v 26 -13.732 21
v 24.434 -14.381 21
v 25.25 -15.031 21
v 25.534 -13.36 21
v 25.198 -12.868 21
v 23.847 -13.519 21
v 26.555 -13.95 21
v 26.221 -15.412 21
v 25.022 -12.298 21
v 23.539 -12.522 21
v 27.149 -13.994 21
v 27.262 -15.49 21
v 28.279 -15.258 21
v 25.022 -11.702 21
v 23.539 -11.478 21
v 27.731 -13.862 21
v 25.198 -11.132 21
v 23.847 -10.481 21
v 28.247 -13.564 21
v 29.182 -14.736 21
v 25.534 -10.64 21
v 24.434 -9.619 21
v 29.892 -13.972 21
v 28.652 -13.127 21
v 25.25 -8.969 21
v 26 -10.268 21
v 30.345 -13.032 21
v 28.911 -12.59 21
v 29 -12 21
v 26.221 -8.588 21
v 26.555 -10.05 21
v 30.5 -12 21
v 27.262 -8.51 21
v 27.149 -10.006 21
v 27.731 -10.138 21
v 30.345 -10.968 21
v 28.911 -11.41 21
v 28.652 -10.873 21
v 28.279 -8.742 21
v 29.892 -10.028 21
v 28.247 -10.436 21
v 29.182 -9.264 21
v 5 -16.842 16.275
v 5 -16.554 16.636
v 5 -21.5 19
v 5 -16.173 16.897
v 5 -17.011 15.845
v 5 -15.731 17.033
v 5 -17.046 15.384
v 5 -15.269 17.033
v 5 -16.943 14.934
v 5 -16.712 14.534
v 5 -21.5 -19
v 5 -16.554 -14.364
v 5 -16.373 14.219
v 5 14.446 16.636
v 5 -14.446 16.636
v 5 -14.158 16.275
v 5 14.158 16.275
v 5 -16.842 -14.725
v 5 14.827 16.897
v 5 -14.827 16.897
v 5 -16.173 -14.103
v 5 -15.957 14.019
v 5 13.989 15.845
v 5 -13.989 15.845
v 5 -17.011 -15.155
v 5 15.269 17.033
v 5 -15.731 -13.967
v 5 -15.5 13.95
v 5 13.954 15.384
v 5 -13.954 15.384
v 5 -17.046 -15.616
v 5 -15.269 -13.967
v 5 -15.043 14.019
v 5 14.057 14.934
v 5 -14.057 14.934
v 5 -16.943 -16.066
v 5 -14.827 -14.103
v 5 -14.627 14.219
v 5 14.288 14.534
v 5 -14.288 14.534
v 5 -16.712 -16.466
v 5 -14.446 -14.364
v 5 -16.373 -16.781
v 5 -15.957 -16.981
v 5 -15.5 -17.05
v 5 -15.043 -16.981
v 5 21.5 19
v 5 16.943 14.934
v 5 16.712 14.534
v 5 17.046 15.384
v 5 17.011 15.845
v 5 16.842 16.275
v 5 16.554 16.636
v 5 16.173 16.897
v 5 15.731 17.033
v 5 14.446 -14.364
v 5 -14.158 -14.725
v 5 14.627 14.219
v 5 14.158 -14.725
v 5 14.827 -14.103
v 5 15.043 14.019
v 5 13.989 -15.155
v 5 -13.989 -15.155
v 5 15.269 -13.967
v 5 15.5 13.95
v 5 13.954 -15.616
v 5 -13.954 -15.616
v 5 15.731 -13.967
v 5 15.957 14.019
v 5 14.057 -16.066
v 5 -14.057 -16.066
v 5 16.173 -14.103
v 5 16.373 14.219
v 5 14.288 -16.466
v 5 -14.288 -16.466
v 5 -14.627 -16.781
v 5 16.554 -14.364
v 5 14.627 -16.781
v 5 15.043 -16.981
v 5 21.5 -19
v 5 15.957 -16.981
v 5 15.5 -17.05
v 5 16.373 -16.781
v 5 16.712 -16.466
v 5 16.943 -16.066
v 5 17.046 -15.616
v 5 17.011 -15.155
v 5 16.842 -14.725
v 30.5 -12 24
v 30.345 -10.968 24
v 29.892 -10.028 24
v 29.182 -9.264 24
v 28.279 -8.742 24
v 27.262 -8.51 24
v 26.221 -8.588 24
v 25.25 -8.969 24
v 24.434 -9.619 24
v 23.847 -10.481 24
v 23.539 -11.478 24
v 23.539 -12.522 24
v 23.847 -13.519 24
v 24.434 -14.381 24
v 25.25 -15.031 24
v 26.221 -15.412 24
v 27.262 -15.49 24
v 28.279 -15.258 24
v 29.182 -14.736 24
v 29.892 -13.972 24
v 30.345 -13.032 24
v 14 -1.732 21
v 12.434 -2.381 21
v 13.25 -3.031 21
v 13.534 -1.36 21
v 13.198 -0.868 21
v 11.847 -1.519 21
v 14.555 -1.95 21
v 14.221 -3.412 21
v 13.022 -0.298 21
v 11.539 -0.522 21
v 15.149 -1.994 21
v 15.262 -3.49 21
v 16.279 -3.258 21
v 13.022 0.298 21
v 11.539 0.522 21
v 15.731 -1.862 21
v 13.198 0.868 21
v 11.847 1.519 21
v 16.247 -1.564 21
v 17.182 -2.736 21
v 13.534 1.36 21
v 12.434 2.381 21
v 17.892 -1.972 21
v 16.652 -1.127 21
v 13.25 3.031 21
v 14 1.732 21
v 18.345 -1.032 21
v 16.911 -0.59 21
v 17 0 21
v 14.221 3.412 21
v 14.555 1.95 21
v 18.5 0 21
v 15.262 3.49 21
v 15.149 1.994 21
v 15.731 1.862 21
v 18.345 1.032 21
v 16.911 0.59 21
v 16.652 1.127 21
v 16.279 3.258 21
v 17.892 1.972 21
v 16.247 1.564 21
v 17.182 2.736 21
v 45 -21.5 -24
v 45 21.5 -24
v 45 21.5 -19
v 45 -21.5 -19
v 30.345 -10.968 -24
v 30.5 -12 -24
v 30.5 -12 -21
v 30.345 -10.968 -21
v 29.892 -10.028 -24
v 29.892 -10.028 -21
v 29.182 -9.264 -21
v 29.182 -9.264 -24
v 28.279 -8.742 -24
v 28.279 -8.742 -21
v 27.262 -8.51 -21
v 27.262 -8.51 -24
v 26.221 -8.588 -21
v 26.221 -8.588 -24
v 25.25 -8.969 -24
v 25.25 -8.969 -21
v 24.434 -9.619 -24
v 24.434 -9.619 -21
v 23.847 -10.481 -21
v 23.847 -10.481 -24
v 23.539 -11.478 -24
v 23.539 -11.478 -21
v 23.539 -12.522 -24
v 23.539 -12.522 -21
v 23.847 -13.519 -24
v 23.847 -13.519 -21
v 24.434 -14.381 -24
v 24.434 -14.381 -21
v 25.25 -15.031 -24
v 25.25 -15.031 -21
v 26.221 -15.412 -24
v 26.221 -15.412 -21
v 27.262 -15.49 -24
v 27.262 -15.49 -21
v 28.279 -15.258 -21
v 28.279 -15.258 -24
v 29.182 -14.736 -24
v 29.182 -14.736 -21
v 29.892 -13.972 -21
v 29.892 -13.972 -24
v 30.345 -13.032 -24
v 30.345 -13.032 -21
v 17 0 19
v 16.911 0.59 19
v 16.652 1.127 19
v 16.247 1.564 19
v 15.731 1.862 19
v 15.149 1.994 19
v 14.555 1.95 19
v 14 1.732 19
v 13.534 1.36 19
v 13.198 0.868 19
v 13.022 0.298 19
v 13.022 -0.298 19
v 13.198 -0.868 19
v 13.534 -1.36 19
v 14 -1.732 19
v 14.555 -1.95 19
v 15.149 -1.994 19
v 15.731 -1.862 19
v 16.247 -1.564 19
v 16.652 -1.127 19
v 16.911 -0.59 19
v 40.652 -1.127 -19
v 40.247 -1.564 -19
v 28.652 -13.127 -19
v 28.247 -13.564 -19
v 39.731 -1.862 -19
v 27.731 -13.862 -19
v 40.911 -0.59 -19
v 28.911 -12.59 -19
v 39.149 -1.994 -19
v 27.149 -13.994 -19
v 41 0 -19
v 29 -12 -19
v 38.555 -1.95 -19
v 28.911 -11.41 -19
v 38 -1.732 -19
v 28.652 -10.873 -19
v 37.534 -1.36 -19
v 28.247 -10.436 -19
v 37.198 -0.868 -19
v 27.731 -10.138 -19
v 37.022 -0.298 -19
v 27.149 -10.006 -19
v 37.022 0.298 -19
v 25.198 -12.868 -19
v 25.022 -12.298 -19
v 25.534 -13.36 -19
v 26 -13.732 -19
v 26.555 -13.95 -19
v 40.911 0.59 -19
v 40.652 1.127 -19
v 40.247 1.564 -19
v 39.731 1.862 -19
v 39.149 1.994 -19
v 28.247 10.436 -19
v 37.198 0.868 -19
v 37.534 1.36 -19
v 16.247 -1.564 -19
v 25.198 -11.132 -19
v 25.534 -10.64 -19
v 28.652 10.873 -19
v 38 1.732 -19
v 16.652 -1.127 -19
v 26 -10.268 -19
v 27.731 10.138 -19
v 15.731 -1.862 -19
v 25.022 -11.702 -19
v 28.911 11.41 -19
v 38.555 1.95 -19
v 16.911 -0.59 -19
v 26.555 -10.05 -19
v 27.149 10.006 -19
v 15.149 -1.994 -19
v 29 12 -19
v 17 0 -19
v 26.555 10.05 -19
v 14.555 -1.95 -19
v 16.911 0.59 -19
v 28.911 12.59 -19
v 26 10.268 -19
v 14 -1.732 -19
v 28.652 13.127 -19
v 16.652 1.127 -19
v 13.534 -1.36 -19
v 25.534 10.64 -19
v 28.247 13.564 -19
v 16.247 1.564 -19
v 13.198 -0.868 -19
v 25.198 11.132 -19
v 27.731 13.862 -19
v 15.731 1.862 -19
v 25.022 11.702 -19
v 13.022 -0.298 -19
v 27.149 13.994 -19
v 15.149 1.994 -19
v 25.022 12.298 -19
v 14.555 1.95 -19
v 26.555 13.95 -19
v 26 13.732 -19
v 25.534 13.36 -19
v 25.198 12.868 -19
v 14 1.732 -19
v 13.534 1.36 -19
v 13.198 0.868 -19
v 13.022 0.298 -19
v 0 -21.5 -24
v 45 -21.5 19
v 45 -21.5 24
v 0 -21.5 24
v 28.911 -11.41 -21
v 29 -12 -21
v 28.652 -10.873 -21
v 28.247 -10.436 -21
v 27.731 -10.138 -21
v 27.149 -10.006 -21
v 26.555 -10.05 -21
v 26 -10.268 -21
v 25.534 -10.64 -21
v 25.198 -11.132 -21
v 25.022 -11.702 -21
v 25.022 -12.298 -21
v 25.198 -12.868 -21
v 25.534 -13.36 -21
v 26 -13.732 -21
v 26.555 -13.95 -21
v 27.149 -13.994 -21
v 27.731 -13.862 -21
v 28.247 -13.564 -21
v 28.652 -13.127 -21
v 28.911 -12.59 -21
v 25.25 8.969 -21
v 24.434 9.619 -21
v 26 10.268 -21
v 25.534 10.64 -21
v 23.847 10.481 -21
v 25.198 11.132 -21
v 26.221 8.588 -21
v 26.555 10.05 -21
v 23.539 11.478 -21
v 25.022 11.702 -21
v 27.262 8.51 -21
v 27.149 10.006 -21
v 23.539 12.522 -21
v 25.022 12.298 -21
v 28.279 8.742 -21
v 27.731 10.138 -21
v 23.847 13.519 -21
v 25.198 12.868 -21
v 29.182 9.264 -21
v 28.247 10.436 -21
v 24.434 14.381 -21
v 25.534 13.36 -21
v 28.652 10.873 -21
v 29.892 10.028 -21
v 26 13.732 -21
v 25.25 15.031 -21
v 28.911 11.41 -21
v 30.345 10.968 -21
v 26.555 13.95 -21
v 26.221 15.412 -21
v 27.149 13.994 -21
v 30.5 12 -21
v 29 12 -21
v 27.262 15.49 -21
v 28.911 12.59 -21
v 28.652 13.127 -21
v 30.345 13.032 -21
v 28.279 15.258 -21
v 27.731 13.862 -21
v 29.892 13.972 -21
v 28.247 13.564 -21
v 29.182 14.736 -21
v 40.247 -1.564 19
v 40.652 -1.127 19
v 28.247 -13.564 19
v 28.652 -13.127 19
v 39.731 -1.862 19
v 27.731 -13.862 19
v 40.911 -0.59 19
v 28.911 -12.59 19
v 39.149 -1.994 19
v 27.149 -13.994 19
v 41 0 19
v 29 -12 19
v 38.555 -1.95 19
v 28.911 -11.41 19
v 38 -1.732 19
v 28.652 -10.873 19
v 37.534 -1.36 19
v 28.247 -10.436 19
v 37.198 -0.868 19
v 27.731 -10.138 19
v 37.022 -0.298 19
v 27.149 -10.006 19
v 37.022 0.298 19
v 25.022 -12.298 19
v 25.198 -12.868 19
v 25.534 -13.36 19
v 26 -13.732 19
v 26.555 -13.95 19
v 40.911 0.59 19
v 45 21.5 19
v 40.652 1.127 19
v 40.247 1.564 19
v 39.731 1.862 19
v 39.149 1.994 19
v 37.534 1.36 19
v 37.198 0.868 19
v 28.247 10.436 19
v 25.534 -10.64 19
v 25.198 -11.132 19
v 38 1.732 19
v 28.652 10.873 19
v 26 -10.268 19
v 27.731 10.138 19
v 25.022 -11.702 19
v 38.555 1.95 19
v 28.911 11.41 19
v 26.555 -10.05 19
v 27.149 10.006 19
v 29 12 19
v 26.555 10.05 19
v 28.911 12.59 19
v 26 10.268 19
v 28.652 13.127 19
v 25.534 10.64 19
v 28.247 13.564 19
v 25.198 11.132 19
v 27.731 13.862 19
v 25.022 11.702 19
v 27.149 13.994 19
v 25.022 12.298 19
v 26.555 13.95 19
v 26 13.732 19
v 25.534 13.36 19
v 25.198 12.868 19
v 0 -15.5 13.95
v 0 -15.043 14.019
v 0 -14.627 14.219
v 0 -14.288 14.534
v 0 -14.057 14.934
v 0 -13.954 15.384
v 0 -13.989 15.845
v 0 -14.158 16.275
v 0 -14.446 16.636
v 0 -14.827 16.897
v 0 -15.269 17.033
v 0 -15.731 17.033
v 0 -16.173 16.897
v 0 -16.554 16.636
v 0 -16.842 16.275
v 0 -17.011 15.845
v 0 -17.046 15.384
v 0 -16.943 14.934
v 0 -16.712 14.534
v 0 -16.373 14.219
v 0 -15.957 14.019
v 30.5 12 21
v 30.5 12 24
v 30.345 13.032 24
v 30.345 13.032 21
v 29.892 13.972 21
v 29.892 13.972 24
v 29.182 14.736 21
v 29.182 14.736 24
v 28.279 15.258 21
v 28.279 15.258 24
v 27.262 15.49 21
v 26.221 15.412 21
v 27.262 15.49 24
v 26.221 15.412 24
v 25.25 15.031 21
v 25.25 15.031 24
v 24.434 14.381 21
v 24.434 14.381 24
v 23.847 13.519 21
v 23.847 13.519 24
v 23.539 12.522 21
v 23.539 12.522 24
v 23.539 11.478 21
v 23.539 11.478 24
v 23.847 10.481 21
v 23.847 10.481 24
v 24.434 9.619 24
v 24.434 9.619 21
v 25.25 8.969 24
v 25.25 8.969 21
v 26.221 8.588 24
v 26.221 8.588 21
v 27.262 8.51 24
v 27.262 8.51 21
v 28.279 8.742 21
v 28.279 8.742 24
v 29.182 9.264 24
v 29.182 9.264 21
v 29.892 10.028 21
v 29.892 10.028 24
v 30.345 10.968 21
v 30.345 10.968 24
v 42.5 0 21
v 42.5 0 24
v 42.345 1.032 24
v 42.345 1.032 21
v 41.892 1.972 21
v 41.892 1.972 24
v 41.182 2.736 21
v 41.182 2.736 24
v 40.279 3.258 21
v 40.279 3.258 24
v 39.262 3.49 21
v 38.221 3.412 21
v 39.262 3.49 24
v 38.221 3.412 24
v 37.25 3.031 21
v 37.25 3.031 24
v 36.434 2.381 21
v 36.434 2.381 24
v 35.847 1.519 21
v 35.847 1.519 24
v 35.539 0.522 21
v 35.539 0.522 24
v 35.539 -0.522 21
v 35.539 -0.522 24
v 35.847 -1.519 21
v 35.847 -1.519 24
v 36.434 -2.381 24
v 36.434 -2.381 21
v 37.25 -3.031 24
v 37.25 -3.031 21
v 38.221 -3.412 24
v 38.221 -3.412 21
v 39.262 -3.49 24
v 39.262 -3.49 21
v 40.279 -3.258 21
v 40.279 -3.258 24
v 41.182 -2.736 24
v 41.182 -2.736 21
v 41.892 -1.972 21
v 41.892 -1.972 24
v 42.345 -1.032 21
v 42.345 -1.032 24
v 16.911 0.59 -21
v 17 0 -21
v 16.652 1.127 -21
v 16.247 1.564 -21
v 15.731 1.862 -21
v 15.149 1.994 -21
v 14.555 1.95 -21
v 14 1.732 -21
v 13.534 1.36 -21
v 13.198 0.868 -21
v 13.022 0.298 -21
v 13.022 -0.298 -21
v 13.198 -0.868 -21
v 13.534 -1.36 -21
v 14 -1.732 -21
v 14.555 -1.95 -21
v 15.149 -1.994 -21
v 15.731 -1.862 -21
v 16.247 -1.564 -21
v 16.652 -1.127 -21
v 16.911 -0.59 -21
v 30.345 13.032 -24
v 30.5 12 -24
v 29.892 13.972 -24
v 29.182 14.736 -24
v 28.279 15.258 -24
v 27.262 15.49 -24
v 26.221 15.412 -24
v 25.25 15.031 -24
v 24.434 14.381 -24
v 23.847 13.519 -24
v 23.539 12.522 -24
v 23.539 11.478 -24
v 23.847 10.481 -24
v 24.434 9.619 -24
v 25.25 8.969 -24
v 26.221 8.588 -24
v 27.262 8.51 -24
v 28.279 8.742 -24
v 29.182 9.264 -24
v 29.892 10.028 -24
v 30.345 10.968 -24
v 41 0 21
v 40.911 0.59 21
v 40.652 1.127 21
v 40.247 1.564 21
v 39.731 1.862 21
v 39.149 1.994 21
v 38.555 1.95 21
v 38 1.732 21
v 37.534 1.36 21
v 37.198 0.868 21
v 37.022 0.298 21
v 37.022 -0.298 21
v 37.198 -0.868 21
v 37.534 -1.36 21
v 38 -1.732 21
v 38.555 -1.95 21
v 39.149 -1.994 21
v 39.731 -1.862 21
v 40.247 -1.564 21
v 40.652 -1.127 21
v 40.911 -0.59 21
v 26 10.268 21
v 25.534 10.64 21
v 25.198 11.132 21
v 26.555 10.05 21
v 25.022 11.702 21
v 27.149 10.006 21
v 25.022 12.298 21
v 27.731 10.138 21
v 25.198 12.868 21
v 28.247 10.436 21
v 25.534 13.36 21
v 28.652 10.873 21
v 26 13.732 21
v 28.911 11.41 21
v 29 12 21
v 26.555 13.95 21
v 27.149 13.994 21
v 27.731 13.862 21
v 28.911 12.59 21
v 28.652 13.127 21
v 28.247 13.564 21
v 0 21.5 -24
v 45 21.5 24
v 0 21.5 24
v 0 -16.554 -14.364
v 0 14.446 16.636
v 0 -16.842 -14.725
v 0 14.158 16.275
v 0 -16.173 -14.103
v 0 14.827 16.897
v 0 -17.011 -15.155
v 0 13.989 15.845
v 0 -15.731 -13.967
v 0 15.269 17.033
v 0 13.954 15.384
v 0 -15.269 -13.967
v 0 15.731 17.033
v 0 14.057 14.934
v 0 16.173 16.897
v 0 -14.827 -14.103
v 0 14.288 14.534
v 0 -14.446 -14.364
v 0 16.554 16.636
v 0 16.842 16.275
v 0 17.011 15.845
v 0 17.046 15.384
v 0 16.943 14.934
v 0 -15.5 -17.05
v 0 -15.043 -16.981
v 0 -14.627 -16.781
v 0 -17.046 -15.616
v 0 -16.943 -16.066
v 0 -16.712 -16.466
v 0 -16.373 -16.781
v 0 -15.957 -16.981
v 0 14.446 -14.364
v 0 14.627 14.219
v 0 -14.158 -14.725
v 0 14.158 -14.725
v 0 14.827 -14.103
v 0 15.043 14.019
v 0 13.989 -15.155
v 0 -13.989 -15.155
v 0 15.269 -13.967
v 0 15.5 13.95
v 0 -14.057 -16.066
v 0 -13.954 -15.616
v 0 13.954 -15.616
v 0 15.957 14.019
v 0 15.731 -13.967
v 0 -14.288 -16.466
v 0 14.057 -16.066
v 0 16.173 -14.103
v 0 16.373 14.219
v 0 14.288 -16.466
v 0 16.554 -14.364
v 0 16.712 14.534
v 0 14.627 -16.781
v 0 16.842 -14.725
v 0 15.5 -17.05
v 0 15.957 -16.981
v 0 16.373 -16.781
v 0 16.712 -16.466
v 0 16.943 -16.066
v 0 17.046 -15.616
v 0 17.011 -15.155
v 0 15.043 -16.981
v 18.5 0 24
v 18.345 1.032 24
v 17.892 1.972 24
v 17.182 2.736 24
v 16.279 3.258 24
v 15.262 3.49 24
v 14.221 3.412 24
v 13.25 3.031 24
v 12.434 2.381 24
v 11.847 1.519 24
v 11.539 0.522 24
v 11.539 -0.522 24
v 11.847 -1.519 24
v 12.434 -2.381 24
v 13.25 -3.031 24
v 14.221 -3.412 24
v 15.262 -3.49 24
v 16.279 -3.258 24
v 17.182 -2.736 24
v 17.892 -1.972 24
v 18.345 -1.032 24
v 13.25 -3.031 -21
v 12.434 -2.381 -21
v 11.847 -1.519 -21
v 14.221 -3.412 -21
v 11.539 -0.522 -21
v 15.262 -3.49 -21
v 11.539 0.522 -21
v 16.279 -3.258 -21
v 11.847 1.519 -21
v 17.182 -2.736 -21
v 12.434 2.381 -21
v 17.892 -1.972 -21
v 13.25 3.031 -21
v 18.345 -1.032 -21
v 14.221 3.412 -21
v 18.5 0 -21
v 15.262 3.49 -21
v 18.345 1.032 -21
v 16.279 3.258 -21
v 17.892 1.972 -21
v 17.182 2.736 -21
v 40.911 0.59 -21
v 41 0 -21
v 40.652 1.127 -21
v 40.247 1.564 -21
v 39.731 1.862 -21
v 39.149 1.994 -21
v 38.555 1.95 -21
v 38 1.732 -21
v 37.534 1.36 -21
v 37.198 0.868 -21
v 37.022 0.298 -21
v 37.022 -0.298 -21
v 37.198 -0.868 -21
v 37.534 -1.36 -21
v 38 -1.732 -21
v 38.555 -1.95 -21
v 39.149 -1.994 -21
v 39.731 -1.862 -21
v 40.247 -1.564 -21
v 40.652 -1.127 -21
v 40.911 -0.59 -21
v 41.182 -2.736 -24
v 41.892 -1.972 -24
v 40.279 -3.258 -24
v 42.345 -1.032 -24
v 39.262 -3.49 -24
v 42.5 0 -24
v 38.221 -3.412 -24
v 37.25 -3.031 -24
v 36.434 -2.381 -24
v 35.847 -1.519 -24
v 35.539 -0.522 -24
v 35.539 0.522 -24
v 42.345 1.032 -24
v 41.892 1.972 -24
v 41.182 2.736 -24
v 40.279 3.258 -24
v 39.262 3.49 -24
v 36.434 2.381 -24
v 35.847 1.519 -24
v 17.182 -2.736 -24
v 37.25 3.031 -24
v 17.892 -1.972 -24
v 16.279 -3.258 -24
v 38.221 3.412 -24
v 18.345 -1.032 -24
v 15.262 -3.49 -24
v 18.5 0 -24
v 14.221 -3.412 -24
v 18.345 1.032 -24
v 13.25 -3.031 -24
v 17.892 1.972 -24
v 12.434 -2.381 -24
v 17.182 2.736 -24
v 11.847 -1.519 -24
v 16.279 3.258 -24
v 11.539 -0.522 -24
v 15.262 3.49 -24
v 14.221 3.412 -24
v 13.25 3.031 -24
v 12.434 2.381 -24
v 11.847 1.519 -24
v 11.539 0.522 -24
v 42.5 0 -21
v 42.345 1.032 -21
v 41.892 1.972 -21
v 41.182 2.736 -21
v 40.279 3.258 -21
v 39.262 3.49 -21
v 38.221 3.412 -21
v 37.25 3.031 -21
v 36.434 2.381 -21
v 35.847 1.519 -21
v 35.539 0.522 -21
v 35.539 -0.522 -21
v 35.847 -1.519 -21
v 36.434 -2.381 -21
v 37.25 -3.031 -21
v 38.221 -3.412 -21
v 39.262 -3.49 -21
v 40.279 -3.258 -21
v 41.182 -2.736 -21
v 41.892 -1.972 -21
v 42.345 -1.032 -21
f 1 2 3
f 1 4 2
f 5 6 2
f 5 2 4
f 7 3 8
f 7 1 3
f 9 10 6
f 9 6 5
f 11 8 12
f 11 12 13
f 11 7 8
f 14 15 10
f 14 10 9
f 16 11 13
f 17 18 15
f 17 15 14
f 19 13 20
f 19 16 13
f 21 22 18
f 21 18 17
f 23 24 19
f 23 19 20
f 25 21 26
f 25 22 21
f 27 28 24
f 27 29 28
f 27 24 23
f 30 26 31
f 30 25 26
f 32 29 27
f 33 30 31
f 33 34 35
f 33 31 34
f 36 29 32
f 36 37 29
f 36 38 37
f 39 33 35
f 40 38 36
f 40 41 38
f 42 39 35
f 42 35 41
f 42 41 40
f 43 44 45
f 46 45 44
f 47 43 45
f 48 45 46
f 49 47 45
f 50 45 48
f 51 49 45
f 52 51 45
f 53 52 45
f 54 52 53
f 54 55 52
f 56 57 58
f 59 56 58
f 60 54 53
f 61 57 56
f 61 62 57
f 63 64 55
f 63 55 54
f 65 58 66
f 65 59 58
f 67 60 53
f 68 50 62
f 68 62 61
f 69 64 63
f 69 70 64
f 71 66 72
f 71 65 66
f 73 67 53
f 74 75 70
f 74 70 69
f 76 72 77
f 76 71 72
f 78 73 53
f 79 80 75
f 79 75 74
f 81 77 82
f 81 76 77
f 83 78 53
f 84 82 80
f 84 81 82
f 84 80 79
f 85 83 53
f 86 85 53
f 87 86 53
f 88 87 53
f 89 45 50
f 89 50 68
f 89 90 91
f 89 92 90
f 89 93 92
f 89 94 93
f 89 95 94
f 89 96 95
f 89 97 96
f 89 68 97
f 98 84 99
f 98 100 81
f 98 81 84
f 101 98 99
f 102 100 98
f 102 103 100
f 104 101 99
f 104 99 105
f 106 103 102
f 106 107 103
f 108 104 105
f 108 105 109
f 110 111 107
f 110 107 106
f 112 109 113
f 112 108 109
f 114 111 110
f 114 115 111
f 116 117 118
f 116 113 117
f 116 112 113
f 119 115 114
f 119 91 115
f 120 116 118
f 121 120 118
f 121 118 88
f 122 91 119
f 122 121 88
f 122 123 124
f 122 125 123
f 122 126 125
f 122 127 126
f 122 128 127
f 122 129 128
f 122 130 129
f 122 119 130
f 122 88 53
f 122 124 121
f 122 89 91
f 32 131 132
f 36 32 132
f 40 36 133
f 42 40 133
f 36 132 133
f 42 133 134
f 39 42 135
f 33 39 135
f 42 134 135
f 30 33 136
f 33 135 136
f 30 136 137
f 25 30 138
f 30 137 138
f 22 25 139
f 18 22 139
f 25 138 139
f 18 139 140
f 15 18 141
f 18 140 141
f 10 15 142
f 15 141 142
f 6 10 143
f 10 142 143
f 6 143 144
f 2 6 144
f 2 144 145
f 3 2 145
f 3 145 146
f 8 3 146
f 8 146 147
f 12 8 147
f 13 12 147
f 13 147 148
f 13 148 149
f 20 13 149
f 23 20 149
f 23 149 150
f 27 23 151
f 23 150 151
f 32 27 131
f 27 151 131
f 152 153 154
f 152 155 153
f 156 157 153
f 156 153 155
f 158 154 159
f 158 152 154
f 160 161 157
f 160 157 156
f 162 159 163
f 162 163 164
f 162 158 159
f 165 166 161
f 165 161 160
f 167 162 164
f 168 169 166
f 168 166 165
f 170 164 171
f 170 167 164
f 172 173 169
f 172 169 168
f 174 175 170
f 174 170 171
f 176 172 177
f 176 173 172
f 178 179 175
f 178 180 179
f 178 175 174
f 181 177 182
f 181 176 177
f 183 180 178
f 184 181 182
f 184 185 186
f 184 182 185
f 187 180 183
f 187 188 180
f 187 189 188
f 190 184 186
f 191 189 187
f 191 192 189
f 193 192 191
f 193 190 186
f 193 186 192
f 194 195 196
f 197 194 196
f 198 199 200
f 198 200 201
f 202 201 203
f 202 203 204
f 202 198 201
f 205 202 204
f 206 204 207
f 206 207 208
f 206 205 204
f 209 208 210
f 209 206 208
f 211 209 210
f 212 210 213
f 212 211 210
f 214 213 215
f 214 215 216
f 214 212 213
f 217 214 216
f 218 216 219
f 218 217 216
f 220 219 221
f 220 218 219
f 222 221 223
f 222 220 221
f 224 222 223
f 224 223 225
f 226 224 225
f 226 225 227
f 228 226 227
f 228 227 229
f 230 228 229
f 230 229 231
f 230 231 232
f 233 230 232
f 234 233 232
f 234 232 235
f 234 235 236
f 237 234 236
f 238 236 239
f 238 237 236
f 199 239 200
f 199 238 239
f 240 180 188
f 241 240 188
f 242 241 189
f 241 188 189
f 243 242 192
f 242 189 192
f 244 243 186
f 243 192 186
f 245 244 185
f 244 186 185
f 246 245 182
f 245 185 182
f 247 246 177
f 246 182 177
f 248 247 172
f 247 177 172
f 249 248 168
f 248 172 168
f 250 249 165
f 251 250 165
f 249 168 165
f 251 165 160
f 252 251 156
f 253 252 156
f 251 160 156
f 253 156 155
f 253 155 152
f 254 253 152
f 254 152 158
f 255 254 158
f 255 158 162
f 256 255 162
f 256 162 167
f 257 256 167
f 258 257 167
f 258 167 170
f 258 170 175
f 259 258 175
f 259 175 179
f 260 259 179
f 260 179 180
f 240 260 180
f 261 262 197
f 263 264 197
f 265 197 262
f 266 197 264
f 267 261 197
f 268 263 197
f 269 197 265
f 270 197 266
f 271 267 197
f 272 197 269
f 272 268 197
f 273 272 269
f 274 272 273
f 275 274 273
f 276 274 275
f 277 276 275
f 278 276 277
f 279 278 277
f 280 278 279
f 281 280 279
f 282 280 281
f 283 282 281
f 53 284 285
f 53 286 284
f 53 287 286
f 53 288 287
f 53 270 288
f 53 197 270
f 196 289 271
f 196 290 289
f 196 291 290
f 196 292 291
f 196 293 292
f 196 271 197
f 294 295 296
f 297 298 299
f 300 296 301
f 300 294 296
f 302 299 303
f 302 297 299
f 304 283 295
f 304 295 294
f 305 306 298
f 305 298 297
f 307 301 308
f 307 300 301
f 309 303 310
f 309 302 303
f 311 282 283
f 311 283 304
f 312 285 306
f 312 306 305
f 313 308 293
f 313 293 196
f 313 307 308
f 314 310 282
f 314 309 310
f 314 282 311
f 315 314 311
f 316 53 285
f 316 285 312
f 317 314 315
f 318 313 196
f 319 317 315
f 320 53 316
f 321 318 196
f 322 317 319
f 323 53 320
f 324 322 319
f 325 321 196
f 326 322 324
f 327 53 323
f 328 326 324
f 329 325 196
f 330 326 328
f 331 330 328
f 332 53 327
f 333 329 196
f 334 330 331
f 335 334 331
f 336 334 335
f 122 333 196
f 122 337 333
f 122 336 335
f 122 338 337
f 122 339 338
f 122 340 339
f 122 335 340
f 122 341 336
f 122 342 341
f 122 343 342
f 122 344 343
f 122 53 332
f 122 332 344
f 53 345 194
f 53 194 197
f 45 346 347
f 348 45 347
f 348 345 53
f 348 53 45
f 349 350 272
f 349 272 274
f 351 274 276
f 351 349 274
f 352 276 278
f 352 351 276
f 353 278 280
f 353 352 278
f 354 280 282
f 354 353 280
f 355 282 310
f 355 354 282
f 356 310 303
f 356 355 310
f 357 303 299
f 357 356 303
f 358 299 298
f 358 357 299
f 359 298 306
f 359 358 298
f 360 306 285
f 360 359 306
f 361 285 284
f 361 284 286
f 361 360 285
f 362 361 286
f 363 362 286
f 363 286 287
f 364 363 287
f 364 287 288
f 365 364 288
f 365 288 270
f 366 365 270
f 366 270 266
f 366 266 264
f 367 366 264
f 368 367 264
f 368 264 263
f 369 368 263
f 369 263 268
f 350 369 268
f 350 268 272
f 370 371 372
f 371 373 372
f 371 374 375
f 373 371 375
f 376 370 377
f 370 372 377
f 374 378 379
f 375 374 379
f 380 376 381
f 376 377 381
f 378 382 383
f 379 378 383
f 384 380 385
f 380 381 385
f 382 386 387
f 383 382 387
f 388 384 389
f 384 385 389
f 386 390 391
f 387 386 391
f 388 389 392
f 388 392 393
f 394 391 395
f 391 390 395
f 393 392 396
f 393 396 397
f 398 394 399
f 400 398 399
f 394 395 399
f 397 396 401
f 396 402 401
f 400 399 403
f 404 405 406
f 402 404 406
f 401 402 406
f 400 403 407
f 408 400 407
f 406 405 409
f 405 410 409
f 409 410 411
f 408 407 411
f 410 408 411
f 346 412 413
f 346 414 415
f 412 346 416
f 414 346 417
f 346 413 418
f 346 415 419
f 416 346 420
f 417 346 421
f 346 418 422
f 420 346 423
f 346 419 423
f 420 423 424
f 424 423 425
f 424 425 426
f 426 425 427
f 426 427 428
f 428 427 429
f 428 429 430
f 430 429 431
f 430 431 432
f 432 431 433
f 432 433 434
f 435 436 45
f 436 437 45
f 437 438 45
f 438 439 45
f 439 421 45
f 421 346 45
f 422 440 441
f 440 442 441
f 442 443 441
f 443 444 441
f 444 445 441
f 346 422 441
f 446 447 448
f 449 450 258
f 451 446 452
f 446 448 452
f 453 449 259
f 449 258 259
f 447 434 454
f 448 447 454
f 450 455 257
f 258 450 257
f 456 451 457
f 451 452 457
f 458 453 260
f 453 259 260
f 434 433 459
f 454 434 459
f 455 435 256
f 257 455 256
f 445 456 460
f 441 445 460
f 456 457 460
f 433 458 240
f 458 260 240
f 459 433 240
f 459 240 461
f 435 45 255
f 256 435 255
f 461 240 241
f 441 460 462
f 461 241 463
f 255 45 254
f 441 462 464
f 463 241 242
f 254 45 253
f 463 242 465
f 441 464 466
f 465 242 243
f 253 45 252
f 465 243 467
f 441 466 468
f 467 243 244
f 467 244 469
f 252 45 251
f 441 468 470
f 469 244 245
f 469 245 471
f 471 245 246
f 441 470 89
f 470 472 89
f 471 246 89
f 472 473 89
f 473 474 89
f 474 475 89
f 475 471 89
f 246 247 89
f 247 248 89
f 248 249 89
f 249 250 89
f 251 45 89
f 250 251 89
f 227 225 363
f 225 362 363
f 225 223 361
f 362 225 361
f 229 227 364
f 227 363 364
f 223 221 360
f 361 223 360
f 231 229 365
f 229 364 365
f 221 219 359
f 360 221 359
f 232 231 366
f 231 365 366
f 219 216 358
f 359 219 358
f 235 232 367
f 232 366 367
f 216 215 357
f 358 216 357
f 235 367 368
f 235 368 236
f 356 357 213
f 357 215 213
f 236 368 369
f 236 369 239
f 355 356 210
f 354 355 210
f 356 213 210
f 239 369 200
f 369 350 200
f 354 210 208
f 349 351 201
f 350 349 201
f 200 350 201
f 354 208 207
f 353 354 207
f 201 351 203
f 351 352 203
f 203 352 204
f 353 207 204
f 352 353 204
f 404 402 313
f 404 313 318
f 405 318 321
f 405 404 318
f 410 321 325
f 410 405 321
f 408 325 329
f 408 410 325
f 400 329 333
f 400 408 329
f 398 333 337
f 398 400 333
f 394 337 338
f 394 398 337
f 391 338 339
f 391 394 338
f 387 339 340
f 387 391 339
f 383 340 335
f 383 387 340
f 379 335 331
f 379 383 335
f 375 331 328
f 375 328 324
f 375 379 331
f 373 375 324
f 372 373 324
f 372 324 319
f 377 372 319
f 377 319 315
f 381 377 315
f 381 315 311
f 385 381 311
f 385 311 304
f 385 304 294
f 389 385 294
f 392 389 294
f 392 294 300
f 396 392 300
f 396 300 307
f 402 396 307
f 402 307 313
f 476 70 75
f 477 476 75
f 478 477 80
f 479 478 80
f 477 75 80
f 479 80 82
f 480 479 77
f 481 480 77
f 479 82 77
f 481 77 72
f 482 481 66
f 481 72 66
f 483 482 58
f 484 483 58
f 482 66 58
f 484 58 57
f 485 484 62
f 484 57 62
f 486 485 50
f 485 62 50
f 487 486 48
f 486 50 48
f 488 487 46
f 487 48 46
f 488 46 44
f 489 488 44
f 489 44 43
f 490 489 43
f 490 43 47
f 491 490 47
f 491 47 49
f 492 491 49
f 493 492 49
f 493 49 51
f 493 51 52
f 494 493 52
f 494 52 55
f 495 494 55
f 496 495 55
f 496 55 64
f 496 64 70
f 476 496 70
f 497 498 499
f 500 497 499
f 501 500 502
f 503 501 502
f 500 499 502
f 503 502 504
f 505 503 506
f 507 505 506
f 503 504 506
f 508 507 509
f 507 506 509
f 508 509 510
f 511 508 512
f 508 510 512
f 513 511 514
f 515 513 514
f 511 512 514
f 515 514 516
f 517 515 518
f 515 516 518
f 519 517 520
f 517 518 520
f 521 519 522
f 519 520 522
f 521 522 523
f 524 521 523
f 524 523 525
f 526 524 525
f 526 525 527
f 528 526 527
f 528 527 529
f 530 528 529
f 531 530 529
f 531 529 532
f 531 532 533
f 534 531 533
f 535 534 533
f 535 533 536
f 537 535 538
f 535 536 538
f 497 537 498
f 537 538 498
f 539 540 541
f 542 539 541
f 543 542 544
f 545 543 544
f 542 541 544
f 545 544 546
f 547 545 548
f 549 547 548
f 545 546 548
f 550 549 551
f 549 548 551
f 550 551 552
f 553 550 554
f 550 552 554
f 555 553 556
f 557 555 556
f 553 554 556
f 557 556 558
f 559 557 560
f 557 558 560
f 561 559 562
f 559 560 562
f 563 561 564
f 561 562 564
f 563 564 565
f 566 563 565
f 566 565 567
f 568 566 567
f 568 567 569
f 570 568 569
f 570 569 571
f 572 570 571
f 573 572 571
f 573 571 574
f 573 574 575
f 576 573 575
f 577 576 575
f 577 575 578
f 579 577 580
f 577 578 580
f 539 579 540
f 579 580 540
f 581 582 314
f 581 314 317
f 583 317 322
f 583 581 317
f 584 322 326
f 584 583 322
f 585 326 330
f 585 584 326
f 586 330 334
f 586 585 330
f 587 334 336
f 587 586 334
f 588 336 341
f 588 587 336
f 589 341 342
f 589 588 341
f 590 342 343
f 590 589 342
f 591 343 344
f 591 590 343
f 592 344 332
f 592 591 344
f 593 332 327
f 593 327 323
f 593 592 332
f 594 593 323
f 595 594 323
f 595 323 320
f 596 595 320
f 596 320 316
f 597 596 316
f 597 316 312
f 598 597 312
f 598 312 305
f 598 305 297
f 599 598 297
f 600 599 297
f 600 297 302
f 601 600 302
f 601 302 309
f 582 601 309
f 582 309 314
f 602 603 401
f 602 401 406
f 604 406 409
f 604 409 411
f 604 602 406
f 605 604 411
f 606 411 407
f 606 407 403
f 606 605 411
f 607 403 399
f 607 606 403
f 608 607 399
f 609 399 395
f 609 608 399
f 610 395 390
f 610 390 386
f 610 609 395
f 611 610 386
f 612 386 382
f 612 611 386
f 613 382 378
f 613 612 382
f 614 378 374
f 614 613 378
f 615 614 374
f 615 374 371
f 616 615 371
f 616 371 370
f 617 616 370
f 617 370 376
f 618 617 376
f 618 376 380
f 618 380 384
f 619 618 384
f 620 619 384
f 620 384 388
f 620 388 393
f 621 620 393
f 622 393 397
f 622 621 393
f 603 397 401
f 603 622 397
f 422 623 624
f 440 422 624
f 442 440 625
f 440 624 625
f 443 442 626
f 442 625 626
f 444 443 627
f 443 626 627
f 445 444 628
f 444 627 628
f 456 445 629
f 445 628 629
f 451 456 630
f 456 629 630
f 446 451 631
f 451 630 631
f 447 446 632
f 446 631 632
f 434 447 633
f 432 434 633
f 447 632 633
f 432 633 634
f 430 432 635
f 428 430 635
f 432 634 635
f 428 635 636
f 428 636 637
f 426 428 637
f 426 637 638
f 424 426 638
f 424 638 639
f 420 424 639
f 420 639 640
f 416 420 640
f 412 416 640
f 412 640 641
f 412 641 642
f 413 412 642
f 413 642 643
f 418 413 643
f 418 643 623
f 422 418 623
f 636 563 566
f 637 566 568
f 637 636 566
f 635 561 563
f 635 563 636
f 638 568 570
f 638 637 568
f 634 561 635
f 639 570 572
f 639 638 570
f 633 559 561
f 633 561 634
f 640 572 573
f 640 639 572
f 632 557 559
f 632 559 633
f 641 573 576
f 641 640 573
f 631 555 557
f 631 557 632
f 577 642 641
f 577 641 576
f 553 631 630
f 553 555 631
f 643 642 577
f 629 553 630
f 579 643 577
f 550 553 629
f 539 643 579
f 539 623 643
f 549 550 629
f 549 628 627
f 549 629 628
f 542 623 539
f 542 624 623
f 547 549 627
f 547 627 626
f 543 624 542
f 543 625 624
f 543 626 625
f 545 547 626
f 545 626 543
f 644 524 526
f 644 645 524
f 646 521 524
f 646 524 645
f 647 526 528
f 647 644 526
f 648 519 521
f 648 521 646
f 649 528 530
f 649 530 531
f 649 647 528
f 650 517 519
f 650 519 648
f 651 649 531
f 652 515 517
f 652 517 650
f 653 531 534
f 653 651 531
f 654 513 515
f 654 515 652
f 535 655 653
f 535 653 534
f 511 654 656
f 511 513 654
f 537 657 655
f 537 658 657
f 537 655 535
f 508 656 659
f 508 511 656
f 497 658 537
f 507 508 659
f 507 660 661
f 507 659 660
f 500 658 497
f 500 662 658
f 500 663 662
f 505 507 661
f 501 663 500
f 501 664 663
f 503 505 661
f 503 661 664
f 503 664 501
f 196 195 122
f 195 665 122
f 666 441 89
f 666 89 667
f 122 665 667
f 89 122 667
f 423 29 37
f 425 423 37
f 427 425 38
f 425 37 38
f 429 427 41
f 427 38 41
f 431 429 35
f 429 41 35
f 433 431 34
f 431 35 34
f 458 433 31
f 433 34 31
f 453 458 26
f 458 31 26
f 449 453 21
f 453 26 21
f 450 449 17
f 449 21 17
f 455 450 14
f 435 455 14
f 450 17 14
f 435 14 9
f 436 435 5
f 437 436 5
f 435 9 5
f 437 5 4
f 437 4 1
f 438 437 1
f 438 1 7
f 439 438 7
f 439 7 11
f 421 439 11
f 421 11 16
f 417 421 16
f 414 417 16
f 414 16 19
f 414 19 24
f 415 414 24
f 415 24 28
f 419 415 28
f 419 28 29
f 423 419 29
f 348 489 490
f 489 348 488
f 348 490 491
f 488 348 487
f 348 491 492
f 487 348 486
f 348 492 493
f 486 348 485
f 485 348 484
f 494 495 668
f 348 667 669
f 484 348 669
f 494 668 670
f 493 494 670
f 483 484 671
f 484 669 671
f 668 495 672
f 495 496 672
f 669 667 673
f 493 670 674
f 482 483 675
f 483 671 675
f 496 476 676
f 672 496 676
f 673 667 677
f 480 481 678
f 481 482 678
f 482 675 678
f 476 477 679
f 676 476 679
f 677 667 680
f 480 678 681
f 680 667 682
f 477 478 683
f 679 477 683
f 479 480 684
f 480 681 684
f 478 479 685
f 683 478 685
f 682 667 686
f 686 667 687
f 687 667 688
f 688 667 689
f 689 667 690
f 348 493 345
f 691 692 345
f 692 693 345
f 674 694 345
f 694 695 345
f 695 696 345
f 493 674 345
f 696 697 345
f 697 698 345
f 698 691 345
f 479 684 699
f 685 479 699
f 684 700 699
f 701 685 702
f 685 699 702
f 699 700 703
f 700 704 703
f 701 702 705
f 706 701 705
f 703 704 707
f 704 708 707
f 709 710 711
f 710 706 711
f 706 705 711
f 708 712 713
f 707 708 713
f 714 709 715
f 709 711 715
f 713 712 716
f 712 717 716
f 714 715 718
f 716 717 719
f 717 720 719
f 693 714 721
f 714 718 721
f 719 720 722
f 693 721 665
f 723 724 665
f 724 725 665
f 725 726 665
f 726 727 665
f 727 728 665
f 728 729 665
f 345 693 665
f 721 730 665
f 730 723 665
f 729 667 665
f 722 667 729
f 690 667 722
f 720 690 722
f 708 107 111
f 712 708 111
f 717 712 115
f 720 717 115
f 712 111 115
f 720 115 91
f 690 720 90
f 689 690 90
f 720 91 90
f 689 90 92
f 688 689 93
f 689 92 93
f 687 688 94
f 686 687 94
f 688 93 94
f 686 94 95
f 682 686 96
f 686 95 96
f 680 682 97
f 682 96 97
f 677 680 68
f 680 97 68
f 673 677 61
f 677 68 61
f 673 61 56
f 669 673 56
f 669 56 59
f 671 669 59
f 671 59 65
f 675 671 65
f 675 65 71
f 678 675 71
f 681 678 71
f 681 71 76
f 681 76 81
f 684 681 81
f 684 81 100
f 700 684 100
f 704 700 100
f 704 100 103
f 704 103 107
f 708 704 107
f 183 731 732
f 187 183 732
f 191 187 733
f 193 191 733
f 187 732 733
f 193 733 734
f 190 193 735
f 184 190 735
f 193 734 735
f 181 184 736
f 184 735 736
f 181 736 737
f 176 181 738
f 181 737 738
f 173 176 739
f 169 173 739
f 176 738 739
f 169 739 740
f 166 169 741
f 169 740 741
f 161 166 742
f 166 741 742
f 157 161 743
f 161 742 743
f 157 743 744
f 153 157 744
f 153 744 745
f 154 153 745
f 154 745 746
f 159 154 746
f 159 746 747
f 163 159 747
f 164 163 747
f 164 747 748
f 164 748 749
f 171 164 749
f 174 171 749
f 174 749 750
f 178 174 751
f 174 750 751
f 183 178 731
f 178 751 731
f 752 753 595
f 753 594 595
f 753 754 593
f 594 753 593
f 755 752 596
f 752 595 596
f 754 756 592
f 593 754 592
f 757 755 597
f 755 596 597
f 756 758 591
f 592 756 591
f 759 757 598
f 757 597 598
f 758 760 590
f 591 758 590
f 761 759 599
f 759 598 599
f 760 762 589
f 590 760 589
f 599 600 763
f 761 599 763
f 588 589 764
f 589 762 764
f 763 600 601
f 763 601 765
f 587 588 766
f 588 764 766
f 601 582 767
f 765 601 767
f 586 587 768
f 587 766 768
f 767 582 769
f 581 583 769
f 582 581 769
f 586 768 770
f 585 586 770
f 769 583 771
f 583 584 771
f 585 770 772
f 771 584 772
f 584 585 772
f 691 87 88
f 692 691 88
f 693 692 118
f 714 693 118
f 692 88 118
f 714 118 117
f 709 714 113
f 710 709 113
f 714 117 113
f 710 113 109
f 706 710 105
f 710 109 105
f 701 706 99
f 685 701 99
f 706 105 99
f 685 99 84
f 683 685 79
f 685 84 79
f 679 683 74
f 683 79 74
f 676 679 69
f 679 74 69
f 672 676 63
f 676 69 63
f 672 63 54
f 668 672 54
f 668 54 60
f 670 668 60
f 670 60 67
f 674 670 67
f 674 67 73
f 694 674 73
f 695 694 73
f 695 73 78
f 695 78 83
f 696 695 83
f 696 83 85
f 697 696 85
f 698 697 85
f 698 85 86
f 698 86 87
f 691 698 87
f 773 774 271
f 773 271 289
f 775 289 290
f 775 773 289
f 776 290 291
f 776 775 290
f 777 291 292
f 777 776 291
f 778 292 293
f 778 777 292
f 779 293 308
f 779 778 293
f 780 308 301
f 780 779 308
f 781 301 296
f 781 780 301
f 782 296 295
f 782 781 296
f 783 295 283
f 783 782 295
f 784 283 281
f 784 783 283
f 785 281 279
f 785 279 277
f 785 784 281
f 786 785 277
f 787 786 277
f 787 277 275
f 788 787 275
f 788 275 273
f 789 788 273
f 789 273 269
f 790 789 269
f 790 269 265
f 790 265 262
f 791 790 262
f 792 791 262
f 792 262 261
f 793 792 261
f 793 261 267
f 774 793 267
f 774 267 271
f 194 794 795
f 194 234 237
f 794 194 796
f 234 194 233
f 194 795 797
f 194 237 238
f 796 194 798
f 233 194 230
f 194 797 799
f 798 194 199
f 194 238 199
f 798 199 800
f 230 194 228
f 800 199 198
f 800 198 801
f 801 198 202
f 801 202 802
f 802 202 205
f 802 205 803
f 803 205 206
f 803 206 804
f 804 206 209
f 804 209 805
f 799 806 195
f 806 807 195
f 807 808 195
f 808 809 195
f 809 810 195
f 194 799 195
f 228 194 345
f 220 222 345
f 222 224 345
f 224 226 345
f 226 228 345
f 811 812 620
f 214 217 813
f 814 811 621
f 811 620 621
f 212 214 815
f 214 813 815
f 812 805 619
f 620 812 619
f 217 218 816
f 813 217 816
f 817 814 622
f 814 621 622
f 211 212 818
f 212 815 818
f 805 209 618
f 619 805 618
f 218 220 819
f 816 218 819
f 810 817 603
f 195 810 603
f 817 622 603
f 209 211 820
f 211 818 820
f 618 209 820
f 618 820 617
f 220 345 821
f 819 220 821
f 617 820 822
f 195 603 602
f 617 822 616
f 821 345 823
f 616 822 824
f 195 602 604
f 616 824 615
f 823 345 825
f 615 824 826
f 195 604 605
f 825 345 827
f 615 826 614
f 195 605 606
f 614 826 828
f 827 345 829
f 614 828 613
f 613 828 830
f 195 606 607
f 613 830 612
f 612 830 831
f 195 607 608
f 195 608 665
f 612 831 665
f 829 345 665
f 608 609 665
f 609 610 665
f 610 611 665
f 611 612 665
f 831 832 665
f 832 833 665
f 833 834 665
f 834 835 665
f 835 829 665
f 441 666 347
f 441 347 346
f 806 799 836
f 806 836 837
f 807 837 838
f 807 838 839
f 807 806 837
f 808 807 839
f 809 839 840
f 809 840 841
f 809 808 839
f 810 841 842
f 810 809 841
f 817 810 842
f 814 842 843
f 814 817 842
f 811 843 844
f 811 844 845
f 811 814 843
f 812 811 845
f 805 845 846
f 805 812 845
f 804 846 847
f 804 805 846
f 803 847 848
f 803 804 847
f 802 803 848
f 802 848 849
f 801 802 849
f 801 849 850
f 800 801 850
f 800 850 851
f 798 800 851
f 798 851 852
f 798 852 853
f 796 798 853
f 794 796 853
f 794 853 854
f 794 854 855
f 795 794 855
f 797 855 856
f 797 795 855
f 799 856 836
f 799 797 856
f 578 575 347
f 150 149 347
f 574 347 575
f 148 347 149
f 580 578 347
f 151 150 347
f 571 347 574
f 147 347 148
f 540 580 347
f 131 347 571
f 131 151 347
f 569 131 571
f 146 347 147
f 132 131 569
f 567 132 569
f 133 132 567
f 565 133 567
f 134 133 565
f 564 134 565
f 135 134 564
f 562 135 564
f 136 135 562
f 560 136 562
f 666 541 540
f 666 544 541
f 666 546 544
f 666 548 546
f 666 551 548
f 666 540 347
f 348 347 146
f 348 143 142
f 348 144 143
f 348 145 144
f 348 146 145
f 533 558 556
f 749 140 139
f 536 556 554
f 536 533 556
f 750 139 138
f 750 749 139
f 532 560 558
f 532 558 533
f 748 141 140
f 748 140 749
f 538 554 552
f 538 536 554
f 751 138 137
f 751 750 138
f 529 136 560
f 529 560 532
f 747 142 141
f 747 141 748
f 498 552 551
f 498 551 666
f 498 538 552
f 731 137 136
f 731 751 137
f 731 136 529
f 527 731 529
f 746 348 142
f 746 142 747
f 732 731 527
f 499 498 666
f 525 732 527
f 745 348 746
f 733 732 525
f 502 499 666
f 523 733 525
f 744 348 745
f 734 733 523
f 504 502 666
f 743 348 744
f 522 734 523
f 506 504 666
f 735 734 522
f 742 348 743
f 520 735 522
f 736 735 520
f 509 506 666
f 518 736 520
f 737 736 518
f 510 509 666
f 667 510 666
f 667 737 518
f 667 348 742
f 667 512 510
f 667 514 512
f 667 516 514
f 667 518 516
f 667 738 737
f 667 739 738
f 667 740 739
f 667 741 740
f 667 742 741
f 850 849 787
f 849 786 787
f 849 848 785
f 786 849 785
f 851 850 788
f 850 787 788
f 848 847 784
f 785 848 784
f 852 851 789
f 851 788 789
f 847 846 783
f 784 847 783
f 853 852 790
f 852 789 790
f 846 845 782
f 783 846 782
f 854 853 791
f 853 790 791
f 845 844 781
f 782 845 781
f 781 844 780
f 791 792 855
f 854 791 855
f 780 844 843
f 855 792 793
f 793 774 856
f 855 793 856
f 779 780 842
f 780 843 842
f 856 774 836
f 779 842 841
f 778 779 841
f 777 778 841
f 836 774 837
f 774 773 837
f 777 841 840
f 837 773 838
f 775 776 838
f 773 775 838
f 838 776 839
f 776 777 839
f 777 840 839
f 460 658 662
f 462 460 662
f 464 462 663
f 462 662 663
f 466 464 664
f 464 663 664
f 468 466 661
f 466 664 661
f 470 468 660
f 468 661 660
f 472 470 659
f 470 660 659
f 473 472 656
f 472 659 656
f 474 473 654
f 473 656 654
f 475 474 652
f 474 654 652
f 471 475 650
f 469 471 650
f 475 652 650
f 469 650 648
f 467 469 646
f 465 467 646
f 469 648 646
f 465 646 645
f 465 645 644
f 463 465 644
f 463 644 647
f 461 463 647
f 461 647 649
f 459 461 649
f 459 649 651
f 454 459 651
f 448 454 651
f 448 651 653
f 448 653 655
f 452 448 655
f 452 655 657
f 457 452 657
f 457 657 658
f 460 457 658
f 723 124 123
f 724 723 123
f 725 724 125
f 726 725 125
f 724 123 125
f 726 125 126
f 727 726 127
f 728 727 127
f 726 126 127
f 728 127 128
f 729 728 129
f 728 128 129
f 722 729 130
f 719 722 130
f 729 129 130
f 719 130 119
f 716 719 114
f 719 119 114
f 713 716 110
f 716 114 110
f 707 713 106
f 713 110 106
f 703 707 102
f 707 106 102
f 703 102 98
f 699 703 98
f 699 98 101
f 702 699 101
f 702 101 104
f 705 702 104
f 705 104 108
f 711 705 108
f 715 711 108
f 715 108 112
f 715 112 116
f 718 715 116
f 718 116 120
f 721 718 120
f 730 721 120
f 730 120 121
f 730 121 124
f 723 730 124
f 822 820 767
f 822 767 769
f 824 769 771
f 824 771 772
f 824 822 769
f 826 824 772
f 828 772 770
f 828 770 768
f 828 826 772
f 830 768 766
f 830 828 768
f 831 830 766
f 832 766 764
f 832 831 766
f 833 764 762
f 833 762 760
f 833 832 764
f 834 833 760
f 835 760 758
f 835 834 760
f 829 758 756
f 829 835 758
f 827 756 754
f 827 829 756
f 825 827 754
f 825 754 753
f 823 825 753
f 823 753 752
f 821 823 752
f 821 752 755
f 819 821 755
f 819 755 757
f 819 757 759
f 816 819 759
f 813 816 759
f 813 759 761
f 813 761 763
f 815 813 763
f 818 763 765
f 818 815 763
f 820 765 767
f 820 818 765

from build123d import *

# Parameters (mm, degrees)
SKETCH1_W           = 48
SKETCH1_H           = 43
BOSS_EXTRUDE1_DEPTH = 5
CUT_EXTRUDE1_REACH  = 34.608
SKETCH2_R           = 1.55
SKETCH4_W           = 5
SKETCH4_H           = 43
BOSS_EXTRUDE2_DEPTH = 40
CUT_EXTRUDE2_REACH  = 71.219
SKETCH6_R           = 2
SKETCH7_R           = 3.5
CUT_EXTRUDE3_DEPTH  = 3


with BuildPart() as part:
    # Sketch1 → Boss-Extrude1 (new body)
    with BuildSketch(Plane(origin=(0, 0, 0), x_dir=(0, 0, -1), z_dir=(1, 0, 0))):
        Rectangle(SKETCH1_W, SKETCH1_H)
    extrude(amount=BOSS_EXTRUDE1_DEPTH)

    # Sketch2 → Cut-Extrude1 (cut, up to next)
    with BuildSketch(Plane(origin=(5, 0, 0), x_dir=(0, 0, -1), z_dir=(1, 0, 0)), mode=Mode.PRIVATE) as cut_extrude1_sk1:
        with Locations((-15.5, 15.5)):
            Circle(SKETCH2_R)
    cut_extrude1_tool1 = extrude(cut_extrude1_sk1.sketch, amount=-CUT_EXTRUDE1_REACH, mode=Mode.PRIVATE) & part.part
    # Sketch2 → Cut-Extrude1 (cut, up to next)
    with BuildSketch(Plane(origin=(5, 0, 0), x_dir=(0, 0, -1), z_dir=(1, 0, 0)), mode=Mode.PRIVATE) as cut_extrude1_sk2:
        with Locations((15.5, 15.5)):
            Circle(SKETCH2_R)
    cut_extrude1_tool2 = extrude(cut_extrude1_sk2.sketch, amount=-CUT_EXTRUDE1_REACH, mode=Mode.PRIVATE) & part.part
    # Sketch2 → Cut-Extrude1 (cut, up to next)
    with BuildSketch(Plane(origin=(5, 0, 0), x_dir=(0, 0, -1), z_dir=(1, 0, 0)), mode=Mode.PRIVATE) as cut_extrude1_sk3:
        with Locations((15.5, -15.5)):
            Circle(SKETCH2_R)
    cut_extrude1_tool3 = extrude(cut_extrude1_sk3.sketch, amount=-CUT_EXTRUDE1_REACH, mode=Mode.PRIVATE) & part.part
    # Sketch2 → Cut-Extrude1 (cut, up to next)
    with BuildSketch(Plane(origin=(5, 0, 0), x_dir=(0, 0, -1), z_dir=(1, 0, 0)), mode=Mode.PRIVATE) as cut_extrude1_sk4:
        with Locations((-15.5, -15.5)):
            Circle(SKETCH2_R)
    cut_extrude1_tool4 = extrude(cut_extrude1_sk4.sketch, amount=-CUT_EXTRUDE1_REACH, mode=Mode.PRIVATE) & part.part
    add(cut_extrude1_tool1.solids().sort_by_distance((5, 15.5, 15.5))[0], mode=Mode.SUBTRACT)
    add(cut_extrude1_tool2.solids().sort_by_distance((5, 15.5, -15.5))[0], mode=Mode.SUBTRACT)
    add(cut_extrude1_tool3.solids().sort_by_distance((5, -15.5, -15.5))[0], mode=Mode.SUBTRACT)
    add(cut_extrude1_tool4.solids().sort_by_distance((5, -15.5, 15.5))[0], mode=Mode.SUBTRACT)

    # Sketch4 → Boss-Extrude2 (add)
    with BuildSketch(Plane(origin=(5, 0, 0), x_dir=(0, 0, -1), z_dir=(1, 0, 0))):
        with Locations((-21.5, 0)):
            Rectangle(SKETCH4_W, SKETCH4_H)
    boss_extrude2 = extrude(amount=BOSS_EXTRUDE2_DEPTH)

    # Sketch6 → Cut-Extrude2 (cut, up to next)
    with BuildSketch(Plane.XY.offset(24), mode=Mode.PRIVATE) as cut_extrude2_sk1:
        with Locations((27, 12)):
            Circle(SKETCH6_R)
    cut_extrude2_tool1 = extrude(cut_extrude2_sk1.sketch, amount=-CUT_EXTRUDE2_REACH, mode=Mode.PRIVATE) & part.part
    # Sketch6 → Cut-Extrude2 (cut, up to next)
    with BuildSketch(Plane.XY.offset(24), mode=Mode.PRIVATE) as cut_extrude2_sk2:
        with Locations((39, 0)):
            Circle(SKETCH6_R)
    cut_extrude2_tool2 = extrude(cut_extrude2_sk2.sketch, amount=-CUT_EXTRUDE2_REACH, mode=Mode.PRIVATE) & part.part
    # Sketch6 → Cut-Extrude2 (cut, up to next)
    with BuildSketch(Plane.XY.offset(24), mode=Mode.PRIVATE) as cut_extrude2_sk3:
        with Locations((27, -12)):
            Circle(SKETCH6_R)
    cut_extrude2_tool3 = extrude(cut_extrude2_sk3.sketch, amount=-CUT_EXTRUDE2_REACH, mode=Mode.PRIVATE) & part.part
    # Sketch6 → Cut-Extrude2 (cut, up to next)
    with BuildSketch(Plane.XY.offset(24), mode=Mode.PRIVATE) as cut_extrude2_sk4:
        with Locations((15, 0)):
            Circle(SKETCH6_R)
    cut_extrude2_tool4 = extrude(cut_extrude2_sk4.sketch, amount=-CUT_EXTRUDE2_REACH, mode=Mode.PRIVATE) & part.part
    cut_extrude2_1 = cut_extrude2_tool1.solids().sort_by_distance((27, 12, 24))[0]
    add(cut_extrude2_1, mode=Mode.SUBTRACT)
    cut_extrude2_2 = cut_extrude2_tool2.solids().sort_by_distance((39, 0, 24))[0]
    add(cut_extrude2_2, mode=Mode.SUBTRACT)
    cut_extrude2_3 = cut_extrude2_tool3.solids().sort_by_distance((27, -12, 24))[0]
    add(cut_extrude2_3, mode=Mode.SUBTRACT)
    cut_extrude2_4 = cut_extrude2_tool4.solids().sort_by_distance((15, 0, 24))[0]
    add(cut_extrude2_4, mode=Mode.SUBTRACT)
    cut_extrude2 = cut_extrude2_1 + cut_extrude2_2 + cut_extrude2_3 + cut_extrude2_4  # Cut-Extrude2 as one shape, for the pattern or mirror that repeats it

    # Sketch7 → Cut-Extrude3 (cut)
    with BuildSketch(Plane.XY.offset(24)):
        with Locations((27, 12)):
            Circle(SKETCH7_R)
        with Locations((39, 0)):
            Circle(SKETCH7_R)
        with Locations((27, -12)):
            Circle(SKETCH7_R)
        with Locations((15, 0)):
            Circle(SKETCH7_R)
    cut_extrude3 = extrude(amount=-CUT_EXTRUDE3_DEPTH, mode=Mode.SUBTRACT)

    # Mirror2: Boss-Extrude2, Cut-Extrude2, Cut-Extrude3 across plane
    add(boss_extrude2.mirror(Plane.XY))
    add(cut_extrude2.mirror(Plane.XY), mode=Mode.SUBTRACT)
    add(cut_extrude3.mirror(Plane.XY), mode=Mode.SUBTRACT)


solid = part.part
